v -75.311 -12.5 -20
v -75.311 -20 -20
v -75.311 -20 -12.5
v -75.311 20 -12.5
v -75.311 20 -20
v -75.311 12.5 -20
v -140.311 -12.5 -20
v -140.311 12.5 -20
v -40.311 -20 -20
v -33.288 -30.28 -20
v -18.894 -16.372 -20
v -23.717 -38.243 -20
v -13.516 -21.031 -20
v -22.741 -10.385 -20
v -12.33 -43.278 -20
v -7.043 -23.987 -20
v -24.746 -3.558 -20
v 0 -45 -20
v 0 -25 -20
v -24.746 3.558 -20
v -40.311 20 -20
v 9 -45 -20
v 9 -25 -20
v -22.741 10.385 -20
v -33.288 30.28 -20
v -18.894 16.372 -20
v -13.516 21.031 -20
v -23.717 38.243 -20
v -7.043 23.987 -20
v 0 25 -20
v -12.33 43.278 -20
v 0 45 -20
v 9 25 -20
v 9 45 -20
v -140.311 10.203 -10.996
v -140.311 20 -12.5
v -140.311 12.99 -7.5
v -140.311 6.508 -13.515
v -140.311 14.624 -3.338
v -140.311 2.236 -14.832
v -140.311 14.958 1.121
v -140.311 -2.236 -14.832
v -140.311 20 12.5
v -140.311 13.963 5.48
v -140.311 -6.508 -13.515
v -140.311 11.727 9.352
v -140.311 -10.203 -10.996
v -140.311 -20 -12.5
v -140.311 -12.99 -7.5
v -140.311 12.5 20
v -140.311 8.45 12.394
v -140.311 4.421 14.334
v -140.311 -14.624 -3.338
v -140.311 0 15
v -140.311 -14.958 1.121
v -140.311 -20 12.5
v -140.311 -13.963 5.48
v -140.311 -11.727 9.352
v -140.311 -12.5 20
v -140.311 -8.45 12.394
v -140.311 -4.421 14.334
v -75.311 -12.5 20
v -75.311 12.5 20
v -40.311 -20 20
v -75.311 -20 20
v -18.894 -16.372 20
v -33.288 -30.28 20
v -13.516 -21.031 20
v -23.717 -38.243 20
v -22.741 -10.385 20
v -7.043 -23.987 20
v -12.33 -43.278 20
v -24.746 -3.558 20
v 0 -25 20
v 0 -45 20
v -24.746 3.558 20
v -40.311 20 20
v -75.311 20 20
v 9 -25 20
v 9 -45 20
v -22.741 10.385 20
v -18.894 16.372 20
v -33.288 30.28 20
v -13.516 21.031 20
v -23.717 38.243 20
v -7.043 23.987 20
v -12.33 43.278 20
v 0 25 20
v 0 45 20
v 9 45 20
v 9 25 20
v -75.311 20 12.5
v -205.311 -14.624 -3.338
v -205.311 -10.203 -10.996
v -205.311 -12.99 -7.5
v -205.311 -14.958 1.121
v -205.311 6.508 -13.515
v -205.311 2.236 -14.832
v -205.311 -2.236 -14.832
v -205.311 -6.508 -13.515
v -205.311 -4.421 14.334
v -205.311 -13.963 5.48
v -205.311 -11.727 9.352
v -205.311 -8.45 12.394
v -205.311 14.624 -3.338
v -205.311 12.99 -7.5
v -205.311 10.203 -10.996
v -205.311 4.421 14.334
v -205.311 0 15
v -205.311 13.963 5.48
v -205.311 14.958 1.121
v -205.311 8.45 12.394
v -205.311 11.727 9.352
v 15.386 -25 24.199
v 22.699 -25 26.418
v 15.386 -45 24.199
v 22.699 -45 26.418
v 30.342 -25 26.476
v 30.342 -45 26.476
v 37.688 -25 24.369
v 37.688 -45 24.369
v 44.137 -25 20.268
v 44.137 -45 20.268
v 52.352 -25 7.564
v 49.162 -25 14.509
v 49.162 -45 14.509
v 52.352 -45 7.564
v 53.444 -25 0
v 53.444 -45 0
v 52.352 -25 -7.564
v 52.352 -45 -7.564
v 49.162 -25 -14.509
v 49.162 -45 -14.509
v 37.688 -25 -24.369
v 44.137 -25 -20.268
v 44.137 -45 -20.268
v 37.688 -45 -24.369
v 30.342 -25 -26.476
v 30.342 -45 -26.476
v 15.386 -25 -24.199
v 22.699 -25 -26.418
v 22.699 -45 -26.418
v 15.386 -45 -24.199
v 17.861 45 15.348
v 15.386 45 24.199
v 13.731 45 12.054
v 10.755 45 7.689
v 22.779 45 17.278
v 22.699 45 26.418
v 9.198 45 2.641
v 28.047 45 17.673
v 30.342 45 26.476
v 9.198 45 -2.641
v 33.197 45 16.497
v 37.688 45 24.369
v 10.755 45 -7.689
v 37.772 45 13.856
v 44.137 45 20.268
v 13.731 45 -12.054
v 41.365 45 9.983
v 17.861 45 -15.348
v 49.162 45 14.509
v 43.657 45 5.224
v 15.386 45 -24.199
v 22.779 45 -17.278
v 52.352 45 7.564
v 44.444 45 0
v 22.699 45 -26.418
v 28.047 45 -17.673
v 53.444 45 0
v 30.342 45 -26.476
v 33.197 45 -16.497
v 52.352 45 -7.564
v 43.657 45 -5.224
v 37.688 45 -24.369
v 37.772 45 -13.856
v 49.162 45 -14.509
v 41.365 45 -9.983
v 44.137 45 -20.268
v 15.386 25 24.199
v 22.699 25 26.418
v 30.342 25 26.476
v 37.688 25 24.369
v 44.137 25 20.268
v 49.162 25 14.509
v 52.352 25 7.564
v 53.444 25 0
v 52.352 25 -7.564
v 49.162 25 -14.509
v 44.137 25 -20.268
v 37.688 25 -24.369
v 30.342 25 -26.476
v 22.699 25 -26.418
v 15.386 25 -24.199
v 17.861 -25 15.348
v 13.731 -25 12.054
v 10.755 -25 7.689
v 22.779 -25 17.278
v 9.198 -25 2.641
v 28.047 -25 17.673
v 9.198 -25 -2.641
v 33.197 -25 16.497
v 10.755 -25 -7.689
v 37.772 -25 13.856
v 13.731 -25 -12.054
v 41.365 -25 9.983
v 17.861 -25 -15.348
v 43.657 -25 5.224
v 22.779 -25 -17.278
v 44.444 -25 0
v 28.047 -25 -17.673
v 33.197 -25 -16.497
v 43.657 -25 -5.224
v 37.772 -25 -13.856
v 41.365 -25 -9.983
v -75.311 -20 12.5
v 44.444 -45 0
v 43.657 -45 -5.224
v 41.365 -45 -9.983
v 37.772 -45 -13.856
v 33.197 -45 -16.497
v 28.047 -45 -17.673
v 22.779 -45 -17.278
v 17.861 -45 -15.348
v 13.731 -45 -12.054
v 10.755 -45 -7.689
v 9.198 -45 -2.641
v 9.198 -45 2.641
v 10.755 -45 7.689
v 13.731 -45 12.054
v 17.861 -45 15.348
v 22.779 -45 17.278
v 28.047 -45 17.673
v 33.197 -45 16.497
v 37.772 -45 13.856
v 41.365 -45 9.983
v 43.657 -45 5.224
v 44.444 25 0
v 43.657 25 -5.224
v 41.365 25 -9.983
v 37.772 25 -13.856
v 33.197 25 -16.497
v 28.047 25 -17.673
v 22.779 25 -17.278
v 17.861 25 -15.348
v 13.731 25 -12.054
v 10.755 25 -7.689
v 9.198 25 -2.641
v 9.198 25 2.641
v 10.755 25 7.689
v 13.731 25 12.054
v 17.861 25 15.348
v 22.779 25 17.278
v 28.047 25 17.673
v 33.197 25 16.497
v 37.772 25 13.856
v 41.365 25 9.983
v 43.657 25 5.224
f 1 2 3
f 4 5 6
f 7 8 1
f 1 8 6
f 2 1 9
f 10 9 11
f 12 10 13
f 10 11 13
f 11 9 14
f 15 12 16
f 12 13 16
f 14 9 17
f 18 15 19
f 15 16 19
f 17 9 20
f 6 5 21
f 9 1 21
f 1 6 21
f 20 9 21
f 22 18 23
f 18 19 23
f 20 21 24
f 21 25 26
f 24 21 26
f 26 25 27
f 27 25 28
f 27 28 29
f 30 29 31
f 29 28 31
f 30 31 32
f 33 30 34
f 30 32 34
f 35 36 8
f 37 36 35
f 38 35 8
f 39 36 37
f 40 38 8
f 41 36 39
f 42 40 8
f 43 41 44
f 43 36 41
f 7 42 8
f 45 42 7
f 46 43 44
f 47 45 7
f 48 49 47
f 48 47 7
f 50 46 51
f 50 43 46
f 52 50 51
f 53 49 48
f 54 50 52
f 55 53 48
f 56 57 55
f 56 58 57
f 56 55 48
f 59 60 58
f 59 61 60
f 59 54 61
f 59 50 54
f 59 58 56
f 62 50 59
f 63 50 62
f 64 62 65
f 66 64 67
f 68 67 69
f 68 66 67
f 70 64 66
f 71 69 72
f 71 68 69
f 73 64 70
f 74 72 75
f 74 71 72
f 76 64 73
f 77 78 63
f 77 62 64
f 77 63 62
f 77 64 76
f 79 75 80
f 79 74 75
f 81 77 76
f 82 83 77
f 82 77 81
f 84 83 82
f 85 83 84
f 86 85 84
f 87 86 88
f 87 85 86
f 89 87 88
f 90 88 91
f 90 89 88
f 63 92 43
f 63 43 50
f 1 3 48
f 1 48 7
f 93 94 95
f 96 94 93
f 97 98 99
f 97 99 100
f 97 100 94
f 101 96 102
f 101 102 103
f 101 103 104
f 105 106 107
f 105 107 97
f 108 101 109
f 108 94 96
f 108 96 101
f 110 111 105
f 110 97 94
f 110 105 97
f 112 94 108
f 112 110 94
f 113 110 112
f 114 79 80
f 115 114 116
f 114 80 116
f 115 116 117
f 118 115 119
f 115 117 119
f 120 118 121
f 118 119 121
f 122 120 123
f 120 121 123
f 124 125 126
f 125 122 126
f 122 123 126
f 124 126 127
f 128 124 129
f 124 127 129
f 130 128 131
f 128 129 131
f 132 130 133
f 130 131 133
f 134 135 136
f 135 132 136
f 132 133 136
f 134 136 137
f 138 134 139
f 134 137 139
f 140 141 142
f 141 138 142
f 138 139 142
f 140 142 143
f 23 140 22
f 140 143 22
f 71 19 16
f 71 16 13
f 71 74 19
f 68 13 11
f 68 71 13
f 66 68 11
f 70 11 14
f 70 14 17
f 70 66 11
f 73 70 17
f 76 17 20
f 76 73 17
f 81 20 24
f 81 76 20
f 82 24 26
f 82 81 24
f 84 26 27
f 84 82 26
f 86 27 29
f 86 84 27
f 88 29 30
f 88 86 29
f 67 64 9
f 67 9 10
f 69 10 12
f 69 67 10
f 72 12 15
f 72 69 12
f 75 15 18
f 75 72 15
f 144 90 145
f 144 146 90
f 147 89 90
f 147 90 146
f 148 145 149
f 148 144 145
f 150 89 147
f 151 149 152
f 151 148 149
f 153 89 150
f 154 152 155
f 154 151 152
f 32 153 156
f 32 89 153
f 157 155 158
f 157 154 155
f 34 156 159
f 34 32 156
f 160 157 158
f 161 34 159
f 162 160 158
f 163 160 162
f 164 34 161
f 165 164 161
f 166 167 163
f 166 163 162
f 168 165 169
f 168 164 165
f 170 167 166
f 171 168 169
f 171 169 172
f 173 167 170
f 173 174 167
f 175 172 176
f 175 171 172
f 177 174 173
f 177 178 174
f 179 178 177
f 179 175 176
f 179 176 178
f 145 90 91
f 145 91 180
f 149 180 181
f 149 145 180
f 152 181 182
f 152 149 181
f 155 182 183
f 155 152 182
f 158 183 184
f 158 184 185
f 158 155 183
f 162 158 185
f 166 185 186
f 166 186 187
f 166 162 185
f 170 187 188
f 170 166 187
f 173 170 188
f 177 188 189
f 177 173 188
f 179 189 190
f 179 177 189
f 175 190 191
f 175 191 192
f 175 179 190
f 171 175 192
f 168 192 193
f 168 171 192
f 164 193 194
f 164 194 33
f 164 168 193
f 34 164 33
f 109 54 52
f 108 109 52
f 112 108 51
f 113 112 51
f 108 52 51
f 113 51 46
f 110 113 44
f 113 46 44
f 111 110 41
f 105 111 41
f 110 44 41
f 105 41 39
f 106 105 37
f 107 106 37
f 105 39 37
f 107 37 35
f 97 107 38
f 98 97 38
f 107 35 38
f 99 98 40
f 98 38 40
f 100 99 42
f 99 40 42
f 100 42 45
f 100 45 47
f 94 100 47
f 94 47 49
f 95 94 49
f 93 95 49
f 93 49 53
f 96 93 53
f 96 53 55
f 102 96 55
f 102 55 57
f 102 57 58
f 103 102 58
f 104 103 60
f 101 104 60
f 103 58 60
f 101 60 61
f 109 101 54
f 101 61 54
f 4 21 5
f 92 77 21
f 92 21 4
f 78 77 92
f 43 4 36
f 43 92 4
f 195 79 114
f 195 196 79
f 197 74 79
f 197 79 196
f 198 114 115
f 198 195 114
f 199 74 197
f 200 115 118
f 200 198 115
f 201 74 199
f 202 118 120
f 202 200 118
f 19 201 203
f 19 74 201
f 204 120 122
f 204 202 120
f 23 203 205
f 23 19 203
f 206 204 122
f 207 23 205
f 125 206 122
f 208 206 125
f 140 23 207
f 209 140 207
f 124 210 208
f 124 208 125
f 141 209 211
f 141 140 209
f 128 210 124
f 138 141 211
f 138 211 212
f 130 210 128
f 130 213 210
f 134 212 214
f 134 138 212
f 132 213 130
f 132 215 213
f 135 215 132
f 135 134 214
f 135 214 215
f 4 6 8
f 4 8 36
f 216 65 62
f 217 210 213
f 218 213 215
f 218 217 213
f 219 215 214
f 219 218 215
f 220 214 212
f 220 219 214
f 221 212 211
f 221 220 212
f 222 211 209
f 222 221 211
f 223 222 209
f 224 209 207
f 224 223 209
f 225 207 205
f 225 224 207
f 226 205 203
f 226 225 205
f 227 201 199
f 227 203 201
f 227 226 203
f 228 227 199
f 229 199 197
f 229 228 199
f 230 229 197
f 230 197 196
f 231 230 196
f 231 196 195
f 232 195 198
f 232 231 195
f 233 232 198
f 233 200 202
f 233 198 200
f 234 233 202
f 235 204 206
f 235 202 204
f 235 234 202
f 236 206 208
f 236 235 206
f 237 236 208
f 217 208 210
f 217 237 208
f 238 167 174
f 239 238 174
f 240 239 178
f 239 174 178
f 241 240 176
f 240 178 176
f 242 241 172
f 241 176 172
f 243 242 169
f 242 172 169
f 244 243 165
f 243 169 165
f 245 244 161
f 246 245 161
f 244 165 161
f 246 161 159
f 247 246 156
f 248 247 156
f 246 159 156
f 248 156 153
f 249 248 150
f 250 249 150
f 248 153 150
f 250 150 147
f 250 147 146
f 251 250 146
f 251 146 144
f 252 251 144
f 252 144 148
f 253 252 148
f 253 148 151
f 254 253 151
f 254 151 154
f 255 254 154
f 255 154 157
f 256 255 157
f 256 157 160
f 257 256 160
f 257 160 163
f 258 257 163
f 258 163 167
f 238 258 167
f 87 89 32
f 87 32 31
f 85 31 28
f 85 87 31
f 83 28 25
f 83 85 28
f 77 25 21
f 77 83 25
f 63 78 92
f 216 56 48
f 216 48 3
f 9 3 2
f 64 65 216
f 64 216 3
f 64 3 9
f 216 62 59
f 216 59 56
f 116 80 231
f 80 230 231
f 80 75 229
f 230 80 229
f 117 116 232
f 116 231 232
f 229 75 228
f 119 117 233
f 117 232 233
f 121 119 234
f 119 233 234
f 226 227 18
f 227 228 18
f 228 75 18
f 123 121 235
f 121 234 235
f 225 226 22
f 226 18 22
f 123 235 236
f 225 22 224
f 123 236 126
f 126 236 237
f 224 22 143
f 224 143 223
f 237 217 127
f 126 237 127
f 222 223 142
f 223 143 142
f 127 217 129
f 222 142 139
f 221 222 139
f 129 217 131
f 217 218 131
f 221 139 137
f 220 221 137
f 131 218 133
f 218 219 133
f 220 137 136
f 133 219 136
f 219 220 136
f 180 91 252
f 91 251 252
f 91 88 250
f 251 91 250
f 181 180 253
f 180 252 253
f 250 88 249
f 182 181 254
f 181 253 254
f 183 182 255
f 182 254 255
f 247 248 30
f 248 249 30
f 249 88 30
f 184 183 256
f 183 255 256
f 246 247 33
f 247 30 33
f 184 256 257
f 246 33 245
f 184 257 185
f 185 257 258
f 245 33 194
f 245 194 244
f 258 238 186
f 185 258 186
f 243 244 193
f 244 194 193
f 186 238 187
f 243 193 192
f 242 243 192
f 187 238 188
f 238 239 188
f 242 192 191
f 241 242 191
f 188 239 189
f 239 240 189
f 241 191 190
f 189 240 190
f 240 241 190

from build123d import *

# Parameters (mm, degrees)
BOSS_EXTRUDE1_DEPTH = 20
SKETCH2_R           = 26.722222222
SKETCH2_R_2         = 17.722222222
BOSS_EXTRUDE2_DEPTH = 20
CUT_EXTRUDE1_DEPTH  = 65
SKETCH4_R           = 15
BOSS_EXTRUDE3_DEPTH = 65
CIRPATTERN1_COUNT   = 4


with BuildPart() as part:
    # Sketch1 → Boss-Extrude1 (new body, symmetric)
    with BuildSketch(Plane.XY):
        with BuildLine():
            ThreePointArc((0, -25), (-25, 0), (0, 25))
            Line((0, 25), (9, 25))
            Line((9, 25), (9, 45))
            Line((9, 45), (0, 45))
            ThreePointArc((0, 45), (-23.717082451, 38.242646352), (-40.311288741, 20))
            Line((-40.311288741, 20), (-140.311288741, 20))
            Line((-140.311288741, 20), (-140.311288741, -20))
            Line((-140.311288741, -20), (-40.311288741, -20))
            ThreePointArc((-40.311288741, -20), (-23.717082451, -38.242646352), (0, -45))
            Line((0, -45), (9, -45))
            Line((9, -45), (9, -25))
            Line((9, -25), (0, -25))
        make_face()
    extrude(amount=BOSS_EXTRUDE1_DEPTH, both=True)

    # Sketch2 → Boss-Extrude2 (add)
    with BuildSketch(Plane(origin=(0, 45, 0), x_dir=(1, 0, 0), z_dir=(0, 1, 0))):
        with Locations((26.722222222, 0)):
            Circle(SKETCH2_R)
        with Locations((26.722222222, 0)):
            Circle(SKETCH2_R_2, mode=Mode.SUBTRACT)
    boss_extrude2 = extrude(amount=-BOSS_EXTRUDE2_DEPTH)

    # Mirror1: Boss-Extrude2 across plane
    add(boss_extrude2.mirror(Plane.ZX))

    # Sketch3 → Cut-Extrude1 (cut)
    with BuildSketch(Plane.ZY.offset(140.311288741)):
        Polygon((-12.5, 20), (-20, 20), (-20, 12.5), align=None)
    cut_extrude1 = extrude(amount=-CUT_EXTRUDE1_DEPTH, mode=Mode.SUBTRACT)

    # Sketch4 → Boss-Extrude3 (add)
    with BuildSketch(Plane.ZY.offset(140.311288741)):
        Circle(SKETCH4_R)
    extrude(amount=BOSS_EXTRUDE3_DEPTH)

    # CirPattern1: Cut-Extrude1 ×4 about axis
    cirpattern1_axis = Axis((0, 0, 0), (1, 0, 0))
    for i in range(1, CIRPATTERN1_COUNT):
        add(cut_extrude1.rotate(cirpattern1_axis, i * 360 / CIRPATTERN1_COUNT), mode=Mode.SUBTRACT)


solid = part.part
